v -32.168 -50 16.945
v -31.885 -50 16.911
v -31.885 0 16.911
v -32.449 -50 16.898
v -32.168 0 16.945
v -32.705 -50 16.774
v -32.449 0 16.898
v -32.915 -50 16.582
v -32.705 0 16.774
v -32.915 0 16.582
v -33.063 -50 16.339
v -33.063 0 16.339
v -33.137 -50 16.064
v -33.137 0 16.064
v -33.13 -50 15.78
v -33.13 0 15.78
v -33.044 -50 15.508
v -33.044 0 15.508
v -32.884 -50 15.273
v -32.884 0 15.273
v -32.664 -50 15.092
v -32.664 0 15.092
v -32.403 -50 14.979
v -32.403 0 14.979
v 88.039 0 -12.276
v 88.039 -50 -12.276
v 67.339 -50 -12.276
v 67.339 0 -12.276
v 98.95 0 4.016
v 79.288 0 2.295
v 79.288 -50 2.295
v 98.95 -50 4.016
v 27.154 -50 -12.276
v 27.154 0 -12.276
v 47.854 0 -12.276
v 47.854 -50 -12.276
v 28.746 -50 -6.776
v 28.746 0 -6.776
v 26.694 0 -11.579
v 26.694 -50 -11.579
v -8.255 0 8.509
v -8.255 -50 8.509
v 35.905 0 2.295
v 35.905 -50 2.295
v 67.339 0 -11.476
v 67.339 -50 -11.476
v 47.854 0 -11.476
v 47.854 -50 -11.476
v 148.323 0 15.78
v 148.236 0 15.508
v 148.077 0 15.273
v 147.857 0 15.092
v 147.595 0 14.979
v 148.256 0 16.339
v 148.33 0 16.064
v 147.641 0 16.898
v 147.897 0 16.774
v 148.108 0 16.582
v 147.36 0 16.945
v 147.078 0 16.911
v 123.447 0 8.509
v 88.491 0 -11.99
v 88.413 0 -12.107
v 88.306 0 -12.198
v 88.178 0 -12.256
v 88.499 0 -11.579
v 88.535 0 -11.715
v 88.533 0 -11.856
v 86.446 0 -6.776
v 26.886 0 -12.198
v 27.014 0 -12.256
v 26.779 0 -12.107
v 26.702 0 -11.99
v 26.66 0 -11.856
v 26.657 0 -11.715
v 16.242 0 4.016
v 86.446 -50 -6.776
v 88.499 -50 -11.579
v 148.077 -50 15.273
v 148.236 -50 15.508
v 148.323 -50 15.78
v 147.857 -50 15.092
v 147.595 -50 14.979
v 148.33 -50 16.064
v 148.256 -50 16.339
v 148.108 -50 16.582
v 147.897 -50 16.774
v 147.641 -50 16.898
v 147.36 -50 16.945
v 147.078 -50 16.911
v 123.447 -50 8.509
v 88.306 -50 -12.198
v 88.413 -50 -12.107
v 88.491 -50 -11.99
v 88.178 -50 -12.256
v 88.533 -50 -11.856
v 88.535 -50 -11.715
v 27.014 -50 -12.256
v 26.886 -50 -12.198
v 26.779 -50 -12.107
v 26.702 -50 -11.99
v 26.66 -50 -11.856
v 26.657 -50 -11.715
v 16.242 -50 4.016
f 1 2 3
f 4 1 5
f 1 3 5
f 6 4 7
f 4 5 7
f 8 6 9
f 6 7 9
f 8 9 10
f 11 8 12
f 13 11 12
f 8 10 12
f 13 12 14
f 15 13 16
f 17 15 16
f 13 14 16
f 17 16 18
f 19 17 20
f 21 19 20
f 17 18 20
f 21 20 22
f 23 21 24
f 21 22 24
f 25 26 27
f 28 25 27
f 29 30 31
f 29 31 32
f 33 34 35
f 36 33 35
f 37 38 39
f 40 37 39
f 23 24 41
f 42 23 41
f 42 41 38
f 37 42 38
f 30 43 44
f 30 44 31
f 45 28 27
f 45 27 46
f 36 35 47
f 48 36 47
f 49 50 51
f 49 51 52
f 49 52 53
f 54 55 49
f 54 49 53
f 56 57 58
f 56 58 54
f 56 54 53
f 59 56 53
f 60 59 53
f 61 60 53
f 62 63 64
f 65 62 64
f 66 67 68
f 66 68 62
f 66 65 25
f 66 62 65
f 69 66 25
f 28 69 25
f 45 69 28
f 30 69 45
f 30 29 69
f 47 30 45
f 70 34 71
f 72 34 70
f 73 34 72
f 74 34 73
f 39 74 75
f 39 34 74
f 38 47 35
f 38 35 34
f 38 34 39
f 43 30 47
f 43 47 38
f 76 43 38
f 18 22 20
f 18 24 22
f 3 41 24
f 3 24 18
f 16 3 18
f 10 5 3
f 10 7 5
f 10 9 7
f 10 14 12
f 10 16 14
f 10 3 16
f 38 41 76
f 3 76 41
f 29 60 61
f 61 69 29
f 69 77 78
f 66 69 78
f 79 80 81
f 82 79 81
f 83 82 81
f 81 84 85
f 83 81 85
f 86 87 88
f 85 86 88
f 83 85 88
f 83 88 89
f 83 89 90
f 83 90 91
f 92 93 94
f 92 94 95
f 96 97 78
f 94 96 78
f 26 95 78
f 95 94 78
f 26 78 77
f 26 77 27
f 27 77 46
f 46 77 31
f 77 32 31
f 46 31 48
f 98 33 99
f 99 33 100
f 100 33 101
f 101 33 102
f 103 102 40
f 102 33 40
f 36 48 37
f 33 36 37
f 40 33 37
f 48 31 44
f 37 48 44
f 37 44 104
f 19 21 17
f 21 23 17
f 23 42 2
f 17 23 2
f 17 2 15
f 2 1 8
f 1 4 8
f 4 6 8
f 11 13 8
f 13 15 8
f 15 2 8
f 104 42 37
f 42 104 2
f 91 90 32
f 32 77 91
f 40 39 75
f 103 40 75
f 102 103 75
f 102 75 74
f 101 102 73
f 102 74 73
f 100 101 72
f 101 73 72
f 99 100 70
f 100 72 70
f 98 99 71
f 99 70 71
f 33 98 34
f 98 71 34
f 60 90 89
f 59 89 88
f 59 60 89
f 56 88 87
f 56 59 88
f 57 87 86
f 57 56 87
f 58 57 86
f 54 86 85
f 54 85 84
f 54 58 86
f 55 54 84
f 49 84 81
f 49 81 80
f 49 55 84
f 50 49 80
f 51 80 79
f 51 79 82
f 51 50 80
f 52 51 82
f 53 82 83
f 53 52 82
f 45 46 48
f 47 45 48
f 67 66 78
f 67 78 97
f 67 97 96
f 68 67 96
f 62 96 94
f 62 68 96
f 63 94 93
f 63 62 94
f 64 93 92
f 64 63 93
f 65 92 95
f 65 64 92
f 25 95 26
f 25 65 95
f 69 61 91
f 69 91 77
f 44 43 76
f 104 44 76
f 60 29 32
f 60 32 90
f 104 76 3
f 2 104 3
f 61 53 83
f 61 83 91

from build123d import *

# Parameters (mm, degrees)
F1_DEPTH = 50


with BuildPart() as f1:
    # F0 (on Front) → F1 (new body)
    with BuildSketch(Plane.XZ):
        with BuildLine():
            Line((28.746283, -6.775675), (26.693859, -11.57922))
            ThreePointArc((26.693859, -11.57922), (26.736378, -12.051149), (27.153648, -12.275675))
            Line((27.153648, -12.275675), (47.853648, -12.275675))
            Line((47.853648, -12.275675), (47.853648, -11.475675))
            Line((47.853648, -11.475675), (57.596283, -11.475675))
            Line((57.596283, -11.475675), (57.596283, 2.295394))
            Line((57.596283, 2.295394), (35.904673, 2.295394))
            Line((35.904673, 2.295394), (16.24208, 4.015648))
            Line((16.24208, 4.015648), (-31.885196, 16.911313))
            ThreePointArc((-31.885196, 16.911313), (-33.109942, 16.204206), (-32.402835, 14.97946))
            Line((-32.402835, 14.97946), (-8.254689, 8.508984))
            Line((-8.254689, 8.508984), (15.893457, 2.038508))
            Line((15.893457, 2.038508), (35.817351, 0.295393))
            Line((35.817351, 0.295393), (28.746283, -6.775675))
        make_face()
        Polygon((-8.254689, 8.508984), (28.746283, -6.775675), (35.817351, 0.295393), (15.893457, 2.038508), align=None)
    extrude(amount=F1_DEPTH)

    # F2: F1 across face


with BuildPart() as f1_1:
    add(f1.part)
    add(f1.part.mirror(Plane(origin=(57.596283, -25, -4.59014), x_dir=(0, 1, 0), z_dir=(1, 0, 0))))


solid = f1_1.part
